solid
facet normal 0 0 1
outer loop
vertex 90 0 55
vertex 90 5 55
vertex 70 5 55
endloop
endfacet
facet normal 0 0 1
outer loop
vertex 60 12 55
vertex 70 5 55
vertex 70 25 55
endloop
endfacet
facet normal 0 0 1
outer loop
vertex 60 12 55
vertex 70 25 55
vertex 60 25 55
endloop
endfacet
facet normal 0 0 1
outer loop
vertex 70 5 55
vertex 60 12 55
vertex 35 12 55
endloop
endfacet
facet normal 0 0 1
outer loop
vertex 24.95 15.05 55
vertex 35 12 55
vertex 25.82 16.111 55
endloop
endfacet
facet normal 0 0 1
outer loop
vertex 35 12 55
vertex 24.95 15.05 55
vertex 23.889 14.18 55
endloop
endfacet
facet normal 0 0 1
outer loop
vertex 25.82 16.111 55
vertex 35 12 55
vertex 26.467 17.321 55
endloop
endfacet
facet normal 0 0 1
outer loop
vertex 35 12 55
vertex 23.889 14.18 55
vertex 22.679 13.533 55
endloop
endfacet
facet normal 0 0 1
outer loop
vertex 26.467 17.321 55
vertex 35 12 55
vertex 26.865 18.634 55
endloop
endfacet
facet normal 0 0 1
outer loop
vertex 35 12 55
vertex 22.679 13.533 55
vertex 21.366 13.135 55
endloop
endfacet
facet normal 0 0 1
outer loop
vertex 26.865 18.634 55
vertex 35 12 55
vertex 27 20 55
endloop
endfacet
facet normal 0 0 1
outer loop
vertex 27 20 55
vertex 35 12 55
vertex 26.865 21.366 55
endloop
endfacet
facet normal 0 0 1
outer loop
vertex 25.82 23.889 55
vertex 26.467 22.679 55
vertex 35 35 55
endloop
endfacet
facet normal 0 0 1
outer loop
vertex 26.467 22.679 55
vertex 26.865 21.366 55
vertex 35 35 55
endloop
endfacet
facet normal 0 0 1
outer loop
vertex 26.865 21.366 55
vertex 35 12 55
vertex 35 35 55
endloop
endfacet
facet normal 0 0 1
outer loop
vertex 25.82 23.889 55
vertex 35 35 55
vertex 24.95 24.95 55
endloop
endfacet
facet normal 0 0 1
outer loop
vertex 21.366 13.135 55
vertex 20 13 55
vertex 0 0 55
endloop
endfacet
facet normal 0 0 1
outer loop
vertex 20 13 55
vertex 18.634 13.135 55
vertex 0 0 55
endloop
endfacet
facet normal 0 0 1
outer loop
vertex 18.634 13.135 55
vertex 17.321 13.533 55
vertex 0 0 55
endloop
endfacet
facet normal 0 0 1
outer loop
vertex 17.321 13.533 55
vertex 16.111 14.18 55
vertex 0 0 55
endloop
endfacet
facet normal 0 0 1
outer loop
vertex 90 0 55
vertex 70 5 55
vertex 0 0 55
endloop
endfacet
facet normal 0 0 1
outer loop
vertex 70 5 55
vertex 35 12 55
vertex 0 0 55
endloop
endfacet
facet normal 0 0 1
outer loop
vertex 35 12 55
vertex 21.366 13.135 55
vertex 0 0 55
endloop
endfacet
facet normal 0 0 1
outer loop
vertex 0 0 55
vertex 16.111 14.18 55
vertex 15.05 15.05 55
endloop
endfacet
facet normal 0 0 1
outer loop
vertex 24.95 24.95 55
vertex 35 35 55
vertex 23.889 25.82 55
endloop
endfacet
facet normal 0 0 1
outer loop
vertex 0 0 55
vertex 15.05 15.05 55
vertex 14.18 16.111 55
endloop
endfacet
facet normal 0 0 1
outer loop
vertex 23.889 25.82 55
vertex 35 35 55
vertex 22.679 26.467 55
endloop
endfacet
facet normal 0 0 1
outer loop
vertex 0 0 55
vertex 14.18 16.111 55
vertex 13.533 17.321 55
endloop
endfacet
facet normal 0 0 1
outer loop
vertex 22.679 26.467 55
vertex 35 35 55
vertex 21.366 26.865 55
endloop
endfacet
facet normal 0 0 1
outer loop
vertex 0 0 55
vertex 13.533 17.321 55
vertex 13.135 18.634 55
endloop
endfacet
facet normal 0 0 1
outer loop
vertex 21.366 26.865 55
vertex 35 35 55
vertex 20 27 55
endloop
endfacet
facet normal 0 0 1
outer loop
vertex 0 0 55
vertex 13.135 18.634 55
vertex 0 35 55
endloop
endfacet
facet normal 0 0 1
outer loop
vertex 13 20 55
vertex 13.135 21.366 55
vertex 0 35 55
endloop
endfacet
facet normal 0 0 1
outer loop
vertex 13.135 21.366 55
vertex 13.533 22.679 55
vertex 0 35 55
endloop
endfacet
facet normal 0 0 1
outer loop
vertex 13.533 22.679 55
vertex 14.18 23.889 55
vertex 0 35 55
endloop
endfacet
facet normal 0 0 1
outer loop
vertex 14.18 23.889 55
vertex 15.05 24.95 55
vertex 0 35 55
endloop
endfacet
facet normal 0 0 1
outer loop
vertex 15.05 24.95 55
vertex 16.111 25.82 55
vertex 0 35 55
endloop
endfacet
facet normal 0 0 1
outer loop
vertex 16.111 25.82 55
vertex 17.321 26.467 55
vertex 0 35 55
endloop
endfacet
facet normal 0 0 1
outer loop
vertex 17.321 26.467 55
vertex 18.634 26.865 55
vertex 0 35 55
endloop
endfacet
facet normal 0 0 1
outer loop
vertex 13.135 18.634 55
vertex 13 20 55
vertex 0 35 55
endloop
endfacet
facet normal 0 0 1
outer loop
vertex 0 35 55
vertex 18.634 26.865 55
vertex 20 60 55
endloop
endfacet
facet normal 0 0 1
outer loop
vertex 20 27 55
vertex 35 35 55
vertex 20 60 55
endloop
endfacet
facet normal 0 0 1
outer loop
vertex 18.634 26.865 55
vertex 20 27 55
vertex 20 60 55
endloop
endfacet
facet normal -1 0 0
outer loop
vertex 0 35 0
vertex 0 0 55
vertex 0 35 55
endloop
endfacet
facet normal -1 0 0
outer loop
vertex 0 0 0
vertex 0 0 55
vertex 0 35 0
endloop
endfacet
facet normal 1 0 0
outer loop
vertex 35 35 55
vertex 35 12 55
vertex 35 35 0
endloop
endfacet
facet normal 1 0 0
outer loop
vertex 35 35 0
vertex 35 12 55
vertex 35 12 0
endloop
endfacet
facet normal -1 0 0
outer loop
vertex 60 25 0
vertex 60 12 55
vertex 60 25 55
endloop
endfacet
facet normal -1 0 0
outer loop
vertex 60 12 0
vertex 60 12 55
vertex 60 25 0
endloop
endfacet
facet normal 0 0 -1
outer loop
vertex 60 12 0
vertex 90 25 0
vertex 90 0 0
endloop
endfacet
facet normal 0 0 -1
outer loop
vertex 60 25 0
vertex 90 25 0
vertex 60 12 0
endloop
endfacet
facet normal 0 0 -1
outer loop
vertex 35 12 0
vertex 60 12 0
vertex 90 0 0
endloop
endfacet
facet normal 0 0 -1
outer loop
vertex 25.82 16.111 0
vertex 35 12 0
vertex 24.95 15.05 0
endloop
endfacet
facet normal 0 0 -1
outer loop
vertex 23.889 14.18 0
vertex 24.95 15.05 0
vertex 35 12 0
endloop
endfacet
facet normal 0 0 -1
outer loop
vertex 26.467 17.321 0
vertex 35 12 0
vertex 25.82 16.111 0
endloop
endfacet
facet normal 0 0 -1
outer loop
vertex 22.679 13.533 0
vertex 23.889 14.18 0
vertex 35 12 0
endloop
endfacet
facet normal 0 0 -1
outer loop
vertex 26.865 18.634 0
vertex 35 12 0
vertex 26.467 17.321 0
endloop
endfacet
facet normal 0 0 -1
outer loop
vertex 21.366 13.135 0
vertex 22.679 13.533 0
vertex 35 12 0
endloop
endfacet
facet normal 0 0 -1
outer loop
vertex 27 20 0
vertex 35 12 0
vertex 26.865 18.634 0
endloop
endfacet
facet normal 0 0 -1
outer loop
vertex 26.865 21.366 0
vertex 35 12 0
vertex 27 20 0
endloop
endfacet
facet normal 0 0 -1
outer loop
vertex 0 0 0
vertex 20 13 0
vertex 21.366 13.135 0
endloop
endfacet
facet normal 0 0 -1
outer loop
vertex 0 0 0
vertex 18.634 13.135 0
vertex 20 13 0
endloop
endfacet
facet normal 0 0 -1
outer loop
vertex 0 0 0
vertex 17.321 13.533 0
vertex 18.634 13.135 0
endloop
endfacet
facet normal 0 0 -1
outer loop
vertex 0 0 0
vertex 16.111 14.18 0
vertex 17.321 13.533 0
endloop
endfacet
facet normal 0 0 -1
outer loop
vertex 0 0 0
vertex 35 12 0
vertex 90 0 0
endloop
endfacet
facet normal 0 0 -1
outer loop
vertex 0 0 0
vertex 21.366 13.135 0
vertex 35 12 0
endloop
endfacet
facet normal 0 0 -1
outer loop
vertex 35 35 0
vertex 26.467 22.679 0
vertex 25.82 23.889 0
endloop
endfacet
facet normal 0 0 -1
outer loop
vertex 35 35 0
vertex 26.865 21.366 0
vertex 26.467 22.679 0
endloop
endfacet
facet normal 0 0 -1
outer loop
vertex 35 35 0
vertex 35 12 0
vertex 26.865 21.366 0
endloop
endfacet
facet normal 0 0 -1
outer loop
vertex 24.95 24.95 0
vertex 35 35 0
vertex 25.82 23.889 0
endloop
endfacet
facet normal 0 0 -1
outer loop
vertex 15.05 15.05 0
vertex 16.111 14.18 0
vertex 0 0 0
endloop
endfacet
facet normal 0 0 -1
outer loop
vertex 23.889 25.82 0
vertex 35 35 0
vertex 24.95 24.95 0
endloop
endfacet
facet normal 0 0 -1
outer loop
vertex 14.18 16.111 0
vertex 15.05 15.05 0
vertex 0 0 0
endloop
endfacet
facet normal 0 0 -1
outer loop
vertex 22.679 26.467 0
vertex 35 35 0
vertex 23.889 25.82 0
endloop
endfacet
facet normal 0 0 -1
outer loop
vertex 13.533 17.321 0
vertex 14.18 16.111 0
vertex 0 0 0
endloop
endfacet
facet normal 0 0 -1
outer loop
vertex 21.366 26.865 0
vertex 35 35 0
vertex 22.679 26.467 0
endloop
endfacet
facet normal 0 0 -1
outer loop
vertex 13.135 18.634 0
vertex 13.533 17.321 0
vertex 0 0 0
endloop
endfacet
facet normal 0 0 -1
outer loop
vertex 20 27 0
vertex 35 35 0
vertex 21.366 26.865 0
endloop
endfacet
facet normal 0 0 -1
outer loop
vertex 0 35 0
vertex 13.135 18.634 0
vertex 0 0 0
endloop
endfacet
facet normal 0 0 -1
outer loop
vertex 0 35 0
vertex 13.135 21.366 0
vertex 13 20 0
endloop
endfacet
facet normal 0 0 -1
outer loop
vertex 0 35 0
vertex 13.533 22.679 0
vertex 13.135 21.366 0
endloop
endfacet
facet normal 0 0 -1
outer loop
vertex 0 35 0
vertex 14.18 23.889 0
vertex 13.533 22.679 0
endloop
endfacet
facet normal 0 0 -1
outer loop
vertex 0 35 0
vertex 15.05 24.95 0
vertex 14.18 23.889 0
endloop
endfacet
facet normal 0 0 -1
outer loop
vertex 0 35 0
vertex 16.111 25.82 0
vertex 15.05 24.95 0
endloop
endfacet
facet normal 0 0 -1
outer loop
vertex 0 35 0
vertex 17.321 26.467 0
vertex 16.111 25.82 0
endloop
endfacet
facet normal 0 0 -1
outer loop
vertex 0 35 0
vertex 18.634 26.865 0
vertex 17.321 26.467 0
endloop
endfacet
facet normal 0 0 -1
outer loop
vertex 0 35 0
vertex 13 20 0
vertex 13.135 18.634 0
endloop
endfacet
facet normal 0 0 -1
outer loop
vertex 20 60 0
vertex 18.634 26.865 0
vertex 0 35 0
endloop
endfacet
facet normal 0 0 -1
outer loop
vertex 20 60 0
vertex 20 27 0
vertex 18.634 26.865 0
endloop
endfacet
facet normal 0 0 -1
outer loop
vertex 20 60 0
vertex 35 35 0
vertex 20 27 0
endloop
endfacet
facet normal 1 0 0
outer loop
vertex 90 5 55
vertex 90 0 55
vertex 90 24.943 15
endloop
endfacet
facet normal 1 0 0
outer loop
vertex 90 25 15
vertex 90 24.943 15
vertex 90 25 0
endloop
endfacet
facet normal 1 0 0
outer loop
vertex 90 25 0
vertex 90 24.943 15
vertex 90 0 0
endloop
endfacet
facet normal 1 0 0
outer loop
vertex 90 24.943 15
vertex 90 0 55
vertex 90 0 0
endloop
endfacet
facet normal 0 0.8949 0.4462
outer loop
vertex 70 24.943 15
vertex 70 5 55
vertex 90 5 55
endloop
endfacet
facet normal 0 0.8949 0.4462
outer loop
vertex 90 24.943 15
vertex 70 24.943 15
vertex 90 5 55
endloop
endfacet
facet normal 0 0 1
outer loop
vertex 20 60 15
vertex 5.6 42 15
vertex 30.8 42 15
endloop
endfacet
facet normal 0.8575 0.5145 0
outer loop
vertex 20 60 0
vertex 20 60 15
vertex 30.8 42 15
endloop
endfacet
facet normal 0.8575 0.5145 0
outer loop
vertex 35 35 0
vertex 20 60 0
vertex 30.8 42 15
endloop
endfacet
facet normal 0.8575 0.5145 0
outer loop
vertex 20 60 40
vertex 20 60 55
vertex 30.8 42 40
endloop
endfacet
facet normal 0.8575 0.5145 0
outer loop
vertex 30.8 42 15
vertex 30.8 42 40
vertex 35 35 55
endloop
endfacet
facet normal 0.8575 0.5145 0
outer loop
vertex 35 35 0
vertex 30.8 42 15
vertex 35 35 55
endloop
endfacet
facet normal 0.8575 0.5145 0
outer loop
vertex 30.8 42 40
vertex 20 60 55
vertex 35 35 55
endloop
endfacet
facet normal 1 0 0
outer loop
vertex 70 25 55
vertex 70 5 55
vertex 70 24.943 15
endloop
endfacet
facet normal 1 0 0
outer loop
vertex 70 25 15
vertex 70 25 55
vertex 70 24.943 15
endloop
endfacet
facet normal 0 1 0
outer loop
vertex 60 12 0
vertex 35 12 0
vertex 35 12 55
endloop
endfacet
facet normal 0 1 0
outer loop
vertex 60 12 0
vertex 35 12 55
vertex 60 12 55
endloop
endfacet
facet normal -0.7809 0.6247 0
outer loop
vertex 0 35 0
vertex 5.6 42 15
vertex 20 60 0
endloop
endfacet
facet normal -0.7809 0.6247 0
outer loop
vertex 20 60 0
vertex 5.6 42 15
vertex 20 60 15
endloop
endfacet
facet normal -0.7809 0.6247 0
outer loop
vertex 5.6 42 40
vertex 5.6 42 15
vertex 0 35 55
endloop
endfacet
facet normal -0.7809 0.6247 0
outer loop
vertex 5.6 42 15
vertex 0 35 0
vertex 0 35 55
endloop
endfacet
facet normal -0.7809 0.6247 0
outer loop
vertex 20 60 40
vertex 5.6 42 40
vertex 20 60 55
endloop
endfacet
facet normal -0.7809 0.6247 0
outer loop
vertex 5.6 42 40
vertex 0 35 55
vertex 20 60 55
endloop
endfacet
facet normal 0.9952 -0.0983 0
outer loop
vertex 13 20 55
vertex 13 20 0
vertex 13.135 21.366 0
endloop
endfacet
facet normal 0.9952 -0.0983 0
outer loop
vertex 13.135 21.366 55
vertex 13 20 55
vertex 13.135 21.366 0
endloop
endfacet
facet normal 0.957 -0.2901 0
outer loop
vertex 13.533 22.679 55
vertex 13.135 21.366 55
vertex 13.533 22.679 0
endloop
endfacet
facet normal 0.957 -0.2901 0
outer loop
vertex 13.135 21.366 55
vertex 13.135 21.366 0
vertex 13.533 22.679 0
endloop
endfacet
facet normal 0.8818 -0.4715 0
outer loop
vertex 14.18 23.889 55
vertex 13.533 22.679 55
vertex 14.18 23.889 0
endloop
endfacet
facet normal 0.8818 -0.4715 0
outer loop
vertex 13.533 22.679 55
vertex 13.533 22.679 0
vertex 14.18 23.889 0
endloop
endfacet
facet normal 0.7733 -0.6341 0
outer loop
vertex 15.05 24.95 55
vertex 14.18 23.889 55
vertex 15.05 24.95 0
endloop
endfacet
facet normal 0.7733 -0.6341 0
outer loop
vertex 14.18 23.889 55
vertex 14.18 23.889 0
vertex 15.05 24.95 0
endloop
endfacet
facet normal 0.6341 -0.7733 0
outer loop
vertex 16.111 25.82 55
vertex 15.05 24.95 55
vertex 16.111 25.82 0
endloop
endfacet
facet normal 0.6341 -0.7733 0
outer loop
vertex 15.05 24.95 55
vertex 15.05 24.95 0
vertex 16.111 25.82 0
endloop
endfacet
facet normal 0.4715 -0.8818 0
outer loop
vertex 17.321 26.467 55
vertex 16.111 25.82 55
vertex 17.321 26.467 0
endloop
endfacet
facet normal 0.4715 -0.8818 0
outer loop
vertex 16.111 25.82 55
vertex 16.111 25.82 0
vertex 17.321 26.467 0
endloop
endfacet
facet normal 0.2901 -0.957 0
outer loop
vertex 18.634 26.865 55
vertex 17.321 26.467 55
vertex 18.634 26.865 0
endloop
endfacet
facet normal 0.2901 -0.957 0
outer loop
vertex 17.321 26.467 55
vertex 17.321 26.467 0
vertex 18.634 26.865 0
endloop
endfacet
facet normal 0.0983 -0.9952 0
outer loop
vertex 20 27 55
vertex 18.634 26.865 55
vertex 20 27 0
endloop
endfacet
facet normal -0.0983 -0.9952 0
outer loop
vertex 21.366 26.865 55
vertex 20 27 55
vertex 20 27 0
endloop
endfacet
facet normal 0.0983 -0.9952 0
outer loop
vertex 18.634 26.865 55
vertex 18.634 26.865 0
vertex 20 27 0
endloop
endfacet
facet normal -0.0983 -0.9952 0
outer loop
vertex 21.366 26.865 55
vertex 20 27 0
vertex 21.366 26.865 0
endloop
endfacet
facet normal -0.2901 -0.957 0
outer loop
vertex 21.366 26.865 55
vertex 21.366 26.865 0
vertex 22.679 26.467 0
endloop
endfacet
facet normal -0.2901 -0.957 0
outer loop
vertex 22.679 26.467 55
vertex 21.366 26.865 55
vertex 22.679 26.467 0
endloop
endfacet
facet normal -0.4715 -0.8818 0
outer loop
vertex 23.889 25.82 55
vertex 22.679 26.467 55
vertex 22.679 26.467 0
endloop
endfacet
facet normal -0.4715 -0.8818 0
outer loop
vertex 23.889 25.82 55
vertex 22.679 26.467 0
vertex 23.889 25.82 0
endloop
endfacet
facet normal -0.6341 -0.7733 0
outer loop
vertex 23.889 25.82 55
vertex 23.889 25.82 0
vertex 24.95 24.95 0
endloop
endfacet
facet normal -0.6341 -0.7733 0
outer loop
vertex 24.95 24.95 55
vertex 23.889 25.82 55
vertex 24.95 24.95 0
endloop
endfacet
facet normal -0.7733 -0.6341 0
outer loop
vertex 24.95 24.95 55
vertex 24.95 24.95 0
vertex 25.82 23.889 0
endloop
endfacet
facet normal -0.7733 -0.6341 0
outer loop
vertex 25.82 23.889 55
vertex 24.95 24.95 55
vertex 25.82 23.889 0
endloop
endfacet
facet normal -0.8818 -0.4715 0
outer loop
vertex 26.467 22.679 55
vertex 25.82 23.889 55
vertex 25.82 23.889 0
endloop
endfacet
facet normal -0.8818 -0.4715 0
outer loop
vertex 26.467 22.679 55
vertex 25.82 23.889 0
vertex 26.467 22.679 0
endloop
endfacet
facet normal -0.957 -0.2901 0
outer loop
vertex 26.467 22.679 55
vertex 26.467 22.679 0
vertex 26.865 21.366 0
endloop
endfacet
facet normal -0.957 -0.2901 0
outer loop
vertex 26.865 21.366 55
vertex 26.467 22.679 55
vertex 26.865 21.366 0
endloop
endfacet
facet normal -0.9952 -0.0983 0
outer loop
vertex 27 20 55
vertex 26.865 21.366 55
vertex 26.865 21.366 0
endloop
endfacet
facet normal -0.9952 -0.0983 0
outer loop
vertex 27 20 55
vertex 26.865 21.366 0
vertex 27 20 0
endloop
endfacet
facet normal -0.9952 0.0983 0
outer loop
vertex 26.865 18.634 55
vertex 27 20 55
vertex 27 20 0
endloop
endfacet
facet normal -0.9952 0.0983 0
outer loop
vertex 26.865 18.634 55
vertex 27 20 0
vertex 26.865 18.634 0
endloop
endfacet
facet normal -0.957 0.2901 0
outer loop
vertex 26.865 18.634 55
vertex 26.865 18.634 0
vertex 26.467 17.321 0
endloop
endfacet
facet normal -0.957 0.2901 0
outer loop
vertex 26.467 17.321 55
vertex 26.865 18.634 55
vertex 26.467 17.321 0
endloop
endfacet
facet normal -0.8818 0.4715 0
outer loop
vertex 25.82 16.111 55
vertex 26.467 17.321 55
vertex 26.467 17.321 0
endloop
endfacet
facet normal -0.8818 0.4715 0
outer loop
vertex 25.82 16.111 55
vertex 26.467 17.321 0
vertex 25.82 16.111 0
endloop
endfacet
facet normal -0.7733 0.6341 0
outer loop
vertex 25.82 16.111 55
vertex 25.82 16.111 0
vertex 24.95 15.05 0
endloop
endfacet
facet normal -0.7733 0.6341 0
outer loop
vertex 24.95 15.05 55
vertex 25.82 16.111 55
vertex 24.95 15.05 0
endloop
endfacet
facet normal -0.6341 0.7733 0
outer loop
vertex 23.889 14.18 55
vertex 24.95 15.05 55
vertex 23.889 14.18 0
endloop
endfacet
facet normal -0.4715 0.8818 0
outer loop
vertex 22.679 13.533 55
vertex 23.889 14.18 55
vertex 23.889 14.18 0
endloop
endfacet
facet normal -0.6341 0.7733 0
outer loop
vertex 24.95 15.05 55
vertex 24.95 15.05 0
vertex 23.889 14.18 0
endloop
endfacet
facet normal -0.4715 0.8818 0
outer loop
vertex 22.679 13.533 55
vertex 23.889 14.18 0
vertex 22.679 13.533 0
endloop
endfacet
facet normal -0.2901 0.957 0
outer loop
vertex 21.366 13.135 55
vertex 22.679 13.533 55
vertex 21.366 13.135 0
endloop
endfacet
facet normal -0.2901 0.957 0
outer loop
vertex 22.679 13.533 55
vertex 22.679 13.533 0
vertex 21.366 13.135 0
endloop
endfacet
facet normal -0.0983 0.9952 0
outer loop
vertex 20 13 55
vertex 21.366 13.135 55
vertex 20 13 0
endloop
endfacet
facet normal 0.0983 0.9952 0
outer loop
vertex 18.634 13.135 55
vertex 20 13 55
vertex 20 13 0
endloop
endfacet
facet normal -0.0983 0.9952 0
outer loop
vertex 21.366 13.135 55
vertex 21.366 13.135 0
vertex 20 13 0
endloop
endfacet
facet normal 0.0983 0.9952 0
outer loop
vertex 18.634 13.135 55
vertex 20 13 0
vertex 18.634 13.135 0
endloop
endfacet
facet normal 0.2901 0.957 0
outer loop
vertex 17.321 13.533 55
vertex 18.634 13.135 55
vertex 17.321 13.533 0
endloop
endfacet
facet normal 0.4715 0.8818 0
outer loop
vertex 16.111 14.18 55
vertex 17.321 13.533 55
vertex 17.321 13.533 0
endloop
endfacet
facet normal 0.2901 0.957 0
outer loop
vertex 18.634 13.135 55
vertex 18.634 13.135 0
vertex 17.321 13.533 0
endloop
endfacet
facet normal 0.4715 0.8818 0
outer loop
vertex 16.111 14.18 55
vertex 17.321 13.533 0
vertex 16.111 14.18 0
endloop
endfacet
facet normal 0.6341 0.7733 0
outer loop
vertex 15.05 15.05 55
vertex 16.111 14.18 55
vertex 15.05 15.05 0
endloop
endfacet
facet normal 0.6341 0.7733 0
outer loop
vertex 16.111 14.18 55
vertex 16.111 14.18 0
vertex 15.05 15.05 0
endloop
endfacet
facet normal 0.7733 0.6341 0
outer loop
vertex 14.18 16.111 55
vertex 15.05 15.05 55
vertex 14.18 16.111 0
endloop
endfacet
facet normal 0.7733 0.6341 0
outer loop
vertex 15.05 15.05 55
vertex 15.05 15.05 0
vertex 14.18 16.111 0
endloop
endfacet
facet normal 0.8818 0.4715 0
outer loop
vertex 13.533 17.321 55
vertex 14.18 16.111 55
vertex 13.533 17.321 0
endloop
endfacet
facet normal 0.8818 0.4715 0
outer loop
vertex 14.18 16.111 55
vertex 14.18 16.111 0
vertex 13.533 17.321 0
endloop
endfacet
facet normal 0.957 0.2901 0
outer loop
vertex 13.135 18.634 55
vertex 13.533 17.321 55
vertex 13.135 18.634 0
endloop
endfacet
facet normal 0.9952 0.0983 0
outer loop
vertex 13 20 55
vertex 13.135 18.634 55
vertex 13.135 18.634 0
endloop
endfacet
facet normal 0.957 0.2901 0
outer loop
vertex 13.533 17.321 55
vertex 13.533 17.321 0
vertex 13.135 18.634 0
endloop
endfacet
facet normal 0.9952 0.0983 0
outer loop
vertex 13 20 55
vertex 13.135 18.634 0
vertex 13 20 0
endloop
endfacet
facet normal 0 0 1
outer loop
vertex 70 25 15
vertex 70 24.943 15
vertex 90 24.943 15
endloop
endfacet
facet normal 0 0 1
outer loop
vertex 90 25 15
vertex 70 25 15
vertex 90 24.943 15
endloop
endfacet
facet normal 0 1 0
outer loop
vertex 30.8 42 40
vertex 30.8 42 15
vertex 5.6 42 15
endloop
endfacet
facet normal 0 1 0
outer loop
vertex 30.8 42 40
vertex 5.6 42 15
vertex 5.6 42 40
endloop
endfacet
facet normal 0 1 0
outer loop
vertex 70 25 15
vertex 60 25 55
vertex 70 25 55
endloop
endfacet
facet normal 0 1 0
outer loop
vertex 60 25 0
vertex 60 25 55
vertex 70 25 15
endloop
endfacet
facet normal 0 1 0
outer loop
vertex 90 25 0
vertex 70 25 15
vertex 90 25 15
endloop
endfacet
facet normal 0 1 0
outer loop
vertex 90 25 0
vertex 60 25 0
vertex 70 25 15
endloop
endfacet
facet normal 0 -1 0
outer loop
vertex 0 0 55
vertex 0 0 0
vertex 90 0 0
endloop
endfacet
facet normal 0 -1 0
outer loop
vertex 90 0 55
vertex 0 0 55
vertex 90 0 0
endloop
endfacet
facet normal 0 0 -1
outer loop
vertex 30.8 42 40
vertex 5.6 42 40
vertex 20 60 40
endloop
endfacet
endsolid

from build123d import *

# Parameters (mm, degrees)
SKETCH1_W             = 90
SKETCH1_H             = 55
BOSS_EXTRUDE1_DEPTH   = 5
SKETCH2_W             = 35
SKETCH2_H             = 55
BOSS_EXTRUDE2_DEPTH   = 30
F_1_0MM_DOWEL_HOLE1_D = 14
SKETCH5_W             = 10
SKETCH5_H             = 55
BOSS_EXTRUDE4_DEPTH   = 20
SKETCH8_W             = 20
SKETCH8_H             = 15
BOSS_EXTRUDE5_DEPTH   = 20
CHAMFER1_SIZE2        = 40
CHAMFER1_SIZE         = 19.943264322
SKETCH9_W             = 25
SKETCH9_H             = 55
BOSS_EXTRUDE6_DEPTH   = 7
BOSS_EXTRUDE7_DEPTH   = 55
SKETCH16_W            = 25
SKETCH16_H            = 18
BOSS_EXTRUDE8_DEPTH   = 43
SKETCH17_W            = 25
SKETCH17_H            = 18
CUT_EXTRUDE1_DEPTH    = 43
F_1_0MM_DOWEL_HOLE2_D = 14


with BuildPart() as part:
    # Sketch1 → Boss-Extrude1 (new body)
    with BuildSketch(Plane(origin=(0, 0, 0), x_dir=(1, 0, 0), z_dir=(0, 1, 0))):
        with Locations((45, -27.5)):
            Rectangle(SKETCH1_W, SKETCH1_H)
    extrude(amount=BOSS_EXTRUDE1_DEPTH)

    # Sketch2 → Boss-Extrude2 (add)
    with BuildSketch(Plane(origin=(0, 5, 0), x_dir=(1, 0, 0), z_dir=(0, 1, 0))):
        with Locations((17.5, -27.5)):
            Rectangle(SKETCH2_W, SKETCH2_H)
    extrude(amount=BOSS_EXTRUDE2_DEPTH)

    # Ø1.0mm Dowel Hole1 (through all)
    with Locations(Plane.XY.offset(55)):
        with Locations((20, 20)):
            Hole(F_1_0MM_DOWEL_HOLE1_D / 2)

    # Sketch5 → Boss-Extrude4 (add)
    with BuildSketch(Plane(origin=(0, 5, 0), x_dir=(1, 0, 0), z_dir=(0, 1, 0))):
        with Locations((65, -27.5)):
            Rectangle(SKETCH5_W, SKETCH5_H)
    extrude(amount=BOSS_EXTRUDE4_DEPTH)

    # Sketch8 → Boss-Extrude5 (add)
    with BuildSketch(Plane(origin=(0, 5, 0), x_dir=(1, 0, 0), z_dir=(0, 1, 0))):
        with Locations((80, -7.5)):
            Rectangle(SKETCH8_W, SKETCH8_H)
    extrude(amount=BOSS_EXTRUDE5_DEPTH)

    # Chamfer1
    chamfer1_edges = [part.edges().sort_by_distance(p)[0] for p in [
        (80, 5, 15),
    ]]
    chamfer1_side = [part.faces().sort_by_distance(p)[0] for p in [
        (80, 5.398865286, 15),
    ]]
    chamfer(chamfer1_edges, length=CHAMFER1_SIZE - 0.0001, length2=CHAMFER1_SIZE2 - 0.0001, reference=chamfer1_side[0])  # a hair under: the kernel refuses the full size

    # Sketch9 → Boss-Extrude6 (add)
    with BuildSketch(Plane(origin=(0, 5, 0), x_dir=(1, 0, 0), z_dir=(0, 1, 0))):
        with Locations((47.5, -27.5)):
            Rectangle(SKETCH9_W, SKETCH9_H)
    extrude(amount=BOSS_EXTRUDE6_DEPTH)

    # Sketch12 → Boss-Extrude7 (add)
    with BuildSketch(Plane.XY.offset(55)):
        Polygon((0, 35), (20, 60), (35, 35), (35, 12), (60, 12), (60, 25), (70, 25), (70, 5), (90, 5), (90, 0), (0, 0), align=None)
    extrude(amount=-BOSS_EXTRUDE7_DEPTH)

    # Sketch16 → Boss-Extrude8 (add)
    with BuildSketch(Plane.ZY):
        with Locations((27.5, 51)):
            Rectangle(SKETCH16_W, SKETCH16_H)
    extrude(amount=-BOSS_EXTRUDE8_DEPTH)

    # Sketch17 → Cut-Extrude1 (cut)
    with BuildSketch(Plane.ZY):
        with Locations((27.5, 51)):
            Rectangle(SKETCH17_W, SKETCH17_H)
    extrude(amount=-CUT_EXTRUDE1_DEPTH, mode=Mode.SUBTRACT)

    # Ø1.0mm Dowel Hole2 (through all)
    with Locations(Plane.XY.offset(55)):
        with Locations((20, 20)):
            Hole(F_1_0MM_DOWEL_HOLE2_D / 2)


solid = part.part
